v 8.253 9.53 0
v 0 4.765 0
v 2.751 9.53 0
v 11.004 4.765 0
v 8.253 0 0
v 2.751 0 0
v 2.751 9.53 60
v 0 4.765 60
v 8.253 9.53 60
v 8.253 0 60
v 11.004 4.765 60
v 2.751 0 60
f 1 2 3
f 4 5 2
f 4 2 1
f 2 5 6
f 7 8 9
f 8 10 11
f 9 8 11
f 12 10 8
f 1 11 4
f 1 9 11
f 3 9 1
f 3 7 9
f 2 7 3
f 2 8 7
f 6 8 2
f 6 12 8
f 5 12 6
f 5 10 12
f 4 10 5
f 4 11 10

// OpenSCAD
$fn = 32;

// ----------------------------------------------------------------------
// Key bar: hex key, 60 mm thick
// ----------------------------------------------------------------------

// --- parameters (mm) ---
profile_height = 60;      // extrusion height
profile_points = 6;       // points of the closed outline

profile = [[11.004, 4.765], [8.253, 9.53], [2.751, 9.53], [0, 4.765], [2.751, 0], [8.253, 0]];  // single closed polygon, 6 points, counter clockwise

// --- the one profile operation ---
linear_extrude(height = profile_height) polygon(points = profile);
